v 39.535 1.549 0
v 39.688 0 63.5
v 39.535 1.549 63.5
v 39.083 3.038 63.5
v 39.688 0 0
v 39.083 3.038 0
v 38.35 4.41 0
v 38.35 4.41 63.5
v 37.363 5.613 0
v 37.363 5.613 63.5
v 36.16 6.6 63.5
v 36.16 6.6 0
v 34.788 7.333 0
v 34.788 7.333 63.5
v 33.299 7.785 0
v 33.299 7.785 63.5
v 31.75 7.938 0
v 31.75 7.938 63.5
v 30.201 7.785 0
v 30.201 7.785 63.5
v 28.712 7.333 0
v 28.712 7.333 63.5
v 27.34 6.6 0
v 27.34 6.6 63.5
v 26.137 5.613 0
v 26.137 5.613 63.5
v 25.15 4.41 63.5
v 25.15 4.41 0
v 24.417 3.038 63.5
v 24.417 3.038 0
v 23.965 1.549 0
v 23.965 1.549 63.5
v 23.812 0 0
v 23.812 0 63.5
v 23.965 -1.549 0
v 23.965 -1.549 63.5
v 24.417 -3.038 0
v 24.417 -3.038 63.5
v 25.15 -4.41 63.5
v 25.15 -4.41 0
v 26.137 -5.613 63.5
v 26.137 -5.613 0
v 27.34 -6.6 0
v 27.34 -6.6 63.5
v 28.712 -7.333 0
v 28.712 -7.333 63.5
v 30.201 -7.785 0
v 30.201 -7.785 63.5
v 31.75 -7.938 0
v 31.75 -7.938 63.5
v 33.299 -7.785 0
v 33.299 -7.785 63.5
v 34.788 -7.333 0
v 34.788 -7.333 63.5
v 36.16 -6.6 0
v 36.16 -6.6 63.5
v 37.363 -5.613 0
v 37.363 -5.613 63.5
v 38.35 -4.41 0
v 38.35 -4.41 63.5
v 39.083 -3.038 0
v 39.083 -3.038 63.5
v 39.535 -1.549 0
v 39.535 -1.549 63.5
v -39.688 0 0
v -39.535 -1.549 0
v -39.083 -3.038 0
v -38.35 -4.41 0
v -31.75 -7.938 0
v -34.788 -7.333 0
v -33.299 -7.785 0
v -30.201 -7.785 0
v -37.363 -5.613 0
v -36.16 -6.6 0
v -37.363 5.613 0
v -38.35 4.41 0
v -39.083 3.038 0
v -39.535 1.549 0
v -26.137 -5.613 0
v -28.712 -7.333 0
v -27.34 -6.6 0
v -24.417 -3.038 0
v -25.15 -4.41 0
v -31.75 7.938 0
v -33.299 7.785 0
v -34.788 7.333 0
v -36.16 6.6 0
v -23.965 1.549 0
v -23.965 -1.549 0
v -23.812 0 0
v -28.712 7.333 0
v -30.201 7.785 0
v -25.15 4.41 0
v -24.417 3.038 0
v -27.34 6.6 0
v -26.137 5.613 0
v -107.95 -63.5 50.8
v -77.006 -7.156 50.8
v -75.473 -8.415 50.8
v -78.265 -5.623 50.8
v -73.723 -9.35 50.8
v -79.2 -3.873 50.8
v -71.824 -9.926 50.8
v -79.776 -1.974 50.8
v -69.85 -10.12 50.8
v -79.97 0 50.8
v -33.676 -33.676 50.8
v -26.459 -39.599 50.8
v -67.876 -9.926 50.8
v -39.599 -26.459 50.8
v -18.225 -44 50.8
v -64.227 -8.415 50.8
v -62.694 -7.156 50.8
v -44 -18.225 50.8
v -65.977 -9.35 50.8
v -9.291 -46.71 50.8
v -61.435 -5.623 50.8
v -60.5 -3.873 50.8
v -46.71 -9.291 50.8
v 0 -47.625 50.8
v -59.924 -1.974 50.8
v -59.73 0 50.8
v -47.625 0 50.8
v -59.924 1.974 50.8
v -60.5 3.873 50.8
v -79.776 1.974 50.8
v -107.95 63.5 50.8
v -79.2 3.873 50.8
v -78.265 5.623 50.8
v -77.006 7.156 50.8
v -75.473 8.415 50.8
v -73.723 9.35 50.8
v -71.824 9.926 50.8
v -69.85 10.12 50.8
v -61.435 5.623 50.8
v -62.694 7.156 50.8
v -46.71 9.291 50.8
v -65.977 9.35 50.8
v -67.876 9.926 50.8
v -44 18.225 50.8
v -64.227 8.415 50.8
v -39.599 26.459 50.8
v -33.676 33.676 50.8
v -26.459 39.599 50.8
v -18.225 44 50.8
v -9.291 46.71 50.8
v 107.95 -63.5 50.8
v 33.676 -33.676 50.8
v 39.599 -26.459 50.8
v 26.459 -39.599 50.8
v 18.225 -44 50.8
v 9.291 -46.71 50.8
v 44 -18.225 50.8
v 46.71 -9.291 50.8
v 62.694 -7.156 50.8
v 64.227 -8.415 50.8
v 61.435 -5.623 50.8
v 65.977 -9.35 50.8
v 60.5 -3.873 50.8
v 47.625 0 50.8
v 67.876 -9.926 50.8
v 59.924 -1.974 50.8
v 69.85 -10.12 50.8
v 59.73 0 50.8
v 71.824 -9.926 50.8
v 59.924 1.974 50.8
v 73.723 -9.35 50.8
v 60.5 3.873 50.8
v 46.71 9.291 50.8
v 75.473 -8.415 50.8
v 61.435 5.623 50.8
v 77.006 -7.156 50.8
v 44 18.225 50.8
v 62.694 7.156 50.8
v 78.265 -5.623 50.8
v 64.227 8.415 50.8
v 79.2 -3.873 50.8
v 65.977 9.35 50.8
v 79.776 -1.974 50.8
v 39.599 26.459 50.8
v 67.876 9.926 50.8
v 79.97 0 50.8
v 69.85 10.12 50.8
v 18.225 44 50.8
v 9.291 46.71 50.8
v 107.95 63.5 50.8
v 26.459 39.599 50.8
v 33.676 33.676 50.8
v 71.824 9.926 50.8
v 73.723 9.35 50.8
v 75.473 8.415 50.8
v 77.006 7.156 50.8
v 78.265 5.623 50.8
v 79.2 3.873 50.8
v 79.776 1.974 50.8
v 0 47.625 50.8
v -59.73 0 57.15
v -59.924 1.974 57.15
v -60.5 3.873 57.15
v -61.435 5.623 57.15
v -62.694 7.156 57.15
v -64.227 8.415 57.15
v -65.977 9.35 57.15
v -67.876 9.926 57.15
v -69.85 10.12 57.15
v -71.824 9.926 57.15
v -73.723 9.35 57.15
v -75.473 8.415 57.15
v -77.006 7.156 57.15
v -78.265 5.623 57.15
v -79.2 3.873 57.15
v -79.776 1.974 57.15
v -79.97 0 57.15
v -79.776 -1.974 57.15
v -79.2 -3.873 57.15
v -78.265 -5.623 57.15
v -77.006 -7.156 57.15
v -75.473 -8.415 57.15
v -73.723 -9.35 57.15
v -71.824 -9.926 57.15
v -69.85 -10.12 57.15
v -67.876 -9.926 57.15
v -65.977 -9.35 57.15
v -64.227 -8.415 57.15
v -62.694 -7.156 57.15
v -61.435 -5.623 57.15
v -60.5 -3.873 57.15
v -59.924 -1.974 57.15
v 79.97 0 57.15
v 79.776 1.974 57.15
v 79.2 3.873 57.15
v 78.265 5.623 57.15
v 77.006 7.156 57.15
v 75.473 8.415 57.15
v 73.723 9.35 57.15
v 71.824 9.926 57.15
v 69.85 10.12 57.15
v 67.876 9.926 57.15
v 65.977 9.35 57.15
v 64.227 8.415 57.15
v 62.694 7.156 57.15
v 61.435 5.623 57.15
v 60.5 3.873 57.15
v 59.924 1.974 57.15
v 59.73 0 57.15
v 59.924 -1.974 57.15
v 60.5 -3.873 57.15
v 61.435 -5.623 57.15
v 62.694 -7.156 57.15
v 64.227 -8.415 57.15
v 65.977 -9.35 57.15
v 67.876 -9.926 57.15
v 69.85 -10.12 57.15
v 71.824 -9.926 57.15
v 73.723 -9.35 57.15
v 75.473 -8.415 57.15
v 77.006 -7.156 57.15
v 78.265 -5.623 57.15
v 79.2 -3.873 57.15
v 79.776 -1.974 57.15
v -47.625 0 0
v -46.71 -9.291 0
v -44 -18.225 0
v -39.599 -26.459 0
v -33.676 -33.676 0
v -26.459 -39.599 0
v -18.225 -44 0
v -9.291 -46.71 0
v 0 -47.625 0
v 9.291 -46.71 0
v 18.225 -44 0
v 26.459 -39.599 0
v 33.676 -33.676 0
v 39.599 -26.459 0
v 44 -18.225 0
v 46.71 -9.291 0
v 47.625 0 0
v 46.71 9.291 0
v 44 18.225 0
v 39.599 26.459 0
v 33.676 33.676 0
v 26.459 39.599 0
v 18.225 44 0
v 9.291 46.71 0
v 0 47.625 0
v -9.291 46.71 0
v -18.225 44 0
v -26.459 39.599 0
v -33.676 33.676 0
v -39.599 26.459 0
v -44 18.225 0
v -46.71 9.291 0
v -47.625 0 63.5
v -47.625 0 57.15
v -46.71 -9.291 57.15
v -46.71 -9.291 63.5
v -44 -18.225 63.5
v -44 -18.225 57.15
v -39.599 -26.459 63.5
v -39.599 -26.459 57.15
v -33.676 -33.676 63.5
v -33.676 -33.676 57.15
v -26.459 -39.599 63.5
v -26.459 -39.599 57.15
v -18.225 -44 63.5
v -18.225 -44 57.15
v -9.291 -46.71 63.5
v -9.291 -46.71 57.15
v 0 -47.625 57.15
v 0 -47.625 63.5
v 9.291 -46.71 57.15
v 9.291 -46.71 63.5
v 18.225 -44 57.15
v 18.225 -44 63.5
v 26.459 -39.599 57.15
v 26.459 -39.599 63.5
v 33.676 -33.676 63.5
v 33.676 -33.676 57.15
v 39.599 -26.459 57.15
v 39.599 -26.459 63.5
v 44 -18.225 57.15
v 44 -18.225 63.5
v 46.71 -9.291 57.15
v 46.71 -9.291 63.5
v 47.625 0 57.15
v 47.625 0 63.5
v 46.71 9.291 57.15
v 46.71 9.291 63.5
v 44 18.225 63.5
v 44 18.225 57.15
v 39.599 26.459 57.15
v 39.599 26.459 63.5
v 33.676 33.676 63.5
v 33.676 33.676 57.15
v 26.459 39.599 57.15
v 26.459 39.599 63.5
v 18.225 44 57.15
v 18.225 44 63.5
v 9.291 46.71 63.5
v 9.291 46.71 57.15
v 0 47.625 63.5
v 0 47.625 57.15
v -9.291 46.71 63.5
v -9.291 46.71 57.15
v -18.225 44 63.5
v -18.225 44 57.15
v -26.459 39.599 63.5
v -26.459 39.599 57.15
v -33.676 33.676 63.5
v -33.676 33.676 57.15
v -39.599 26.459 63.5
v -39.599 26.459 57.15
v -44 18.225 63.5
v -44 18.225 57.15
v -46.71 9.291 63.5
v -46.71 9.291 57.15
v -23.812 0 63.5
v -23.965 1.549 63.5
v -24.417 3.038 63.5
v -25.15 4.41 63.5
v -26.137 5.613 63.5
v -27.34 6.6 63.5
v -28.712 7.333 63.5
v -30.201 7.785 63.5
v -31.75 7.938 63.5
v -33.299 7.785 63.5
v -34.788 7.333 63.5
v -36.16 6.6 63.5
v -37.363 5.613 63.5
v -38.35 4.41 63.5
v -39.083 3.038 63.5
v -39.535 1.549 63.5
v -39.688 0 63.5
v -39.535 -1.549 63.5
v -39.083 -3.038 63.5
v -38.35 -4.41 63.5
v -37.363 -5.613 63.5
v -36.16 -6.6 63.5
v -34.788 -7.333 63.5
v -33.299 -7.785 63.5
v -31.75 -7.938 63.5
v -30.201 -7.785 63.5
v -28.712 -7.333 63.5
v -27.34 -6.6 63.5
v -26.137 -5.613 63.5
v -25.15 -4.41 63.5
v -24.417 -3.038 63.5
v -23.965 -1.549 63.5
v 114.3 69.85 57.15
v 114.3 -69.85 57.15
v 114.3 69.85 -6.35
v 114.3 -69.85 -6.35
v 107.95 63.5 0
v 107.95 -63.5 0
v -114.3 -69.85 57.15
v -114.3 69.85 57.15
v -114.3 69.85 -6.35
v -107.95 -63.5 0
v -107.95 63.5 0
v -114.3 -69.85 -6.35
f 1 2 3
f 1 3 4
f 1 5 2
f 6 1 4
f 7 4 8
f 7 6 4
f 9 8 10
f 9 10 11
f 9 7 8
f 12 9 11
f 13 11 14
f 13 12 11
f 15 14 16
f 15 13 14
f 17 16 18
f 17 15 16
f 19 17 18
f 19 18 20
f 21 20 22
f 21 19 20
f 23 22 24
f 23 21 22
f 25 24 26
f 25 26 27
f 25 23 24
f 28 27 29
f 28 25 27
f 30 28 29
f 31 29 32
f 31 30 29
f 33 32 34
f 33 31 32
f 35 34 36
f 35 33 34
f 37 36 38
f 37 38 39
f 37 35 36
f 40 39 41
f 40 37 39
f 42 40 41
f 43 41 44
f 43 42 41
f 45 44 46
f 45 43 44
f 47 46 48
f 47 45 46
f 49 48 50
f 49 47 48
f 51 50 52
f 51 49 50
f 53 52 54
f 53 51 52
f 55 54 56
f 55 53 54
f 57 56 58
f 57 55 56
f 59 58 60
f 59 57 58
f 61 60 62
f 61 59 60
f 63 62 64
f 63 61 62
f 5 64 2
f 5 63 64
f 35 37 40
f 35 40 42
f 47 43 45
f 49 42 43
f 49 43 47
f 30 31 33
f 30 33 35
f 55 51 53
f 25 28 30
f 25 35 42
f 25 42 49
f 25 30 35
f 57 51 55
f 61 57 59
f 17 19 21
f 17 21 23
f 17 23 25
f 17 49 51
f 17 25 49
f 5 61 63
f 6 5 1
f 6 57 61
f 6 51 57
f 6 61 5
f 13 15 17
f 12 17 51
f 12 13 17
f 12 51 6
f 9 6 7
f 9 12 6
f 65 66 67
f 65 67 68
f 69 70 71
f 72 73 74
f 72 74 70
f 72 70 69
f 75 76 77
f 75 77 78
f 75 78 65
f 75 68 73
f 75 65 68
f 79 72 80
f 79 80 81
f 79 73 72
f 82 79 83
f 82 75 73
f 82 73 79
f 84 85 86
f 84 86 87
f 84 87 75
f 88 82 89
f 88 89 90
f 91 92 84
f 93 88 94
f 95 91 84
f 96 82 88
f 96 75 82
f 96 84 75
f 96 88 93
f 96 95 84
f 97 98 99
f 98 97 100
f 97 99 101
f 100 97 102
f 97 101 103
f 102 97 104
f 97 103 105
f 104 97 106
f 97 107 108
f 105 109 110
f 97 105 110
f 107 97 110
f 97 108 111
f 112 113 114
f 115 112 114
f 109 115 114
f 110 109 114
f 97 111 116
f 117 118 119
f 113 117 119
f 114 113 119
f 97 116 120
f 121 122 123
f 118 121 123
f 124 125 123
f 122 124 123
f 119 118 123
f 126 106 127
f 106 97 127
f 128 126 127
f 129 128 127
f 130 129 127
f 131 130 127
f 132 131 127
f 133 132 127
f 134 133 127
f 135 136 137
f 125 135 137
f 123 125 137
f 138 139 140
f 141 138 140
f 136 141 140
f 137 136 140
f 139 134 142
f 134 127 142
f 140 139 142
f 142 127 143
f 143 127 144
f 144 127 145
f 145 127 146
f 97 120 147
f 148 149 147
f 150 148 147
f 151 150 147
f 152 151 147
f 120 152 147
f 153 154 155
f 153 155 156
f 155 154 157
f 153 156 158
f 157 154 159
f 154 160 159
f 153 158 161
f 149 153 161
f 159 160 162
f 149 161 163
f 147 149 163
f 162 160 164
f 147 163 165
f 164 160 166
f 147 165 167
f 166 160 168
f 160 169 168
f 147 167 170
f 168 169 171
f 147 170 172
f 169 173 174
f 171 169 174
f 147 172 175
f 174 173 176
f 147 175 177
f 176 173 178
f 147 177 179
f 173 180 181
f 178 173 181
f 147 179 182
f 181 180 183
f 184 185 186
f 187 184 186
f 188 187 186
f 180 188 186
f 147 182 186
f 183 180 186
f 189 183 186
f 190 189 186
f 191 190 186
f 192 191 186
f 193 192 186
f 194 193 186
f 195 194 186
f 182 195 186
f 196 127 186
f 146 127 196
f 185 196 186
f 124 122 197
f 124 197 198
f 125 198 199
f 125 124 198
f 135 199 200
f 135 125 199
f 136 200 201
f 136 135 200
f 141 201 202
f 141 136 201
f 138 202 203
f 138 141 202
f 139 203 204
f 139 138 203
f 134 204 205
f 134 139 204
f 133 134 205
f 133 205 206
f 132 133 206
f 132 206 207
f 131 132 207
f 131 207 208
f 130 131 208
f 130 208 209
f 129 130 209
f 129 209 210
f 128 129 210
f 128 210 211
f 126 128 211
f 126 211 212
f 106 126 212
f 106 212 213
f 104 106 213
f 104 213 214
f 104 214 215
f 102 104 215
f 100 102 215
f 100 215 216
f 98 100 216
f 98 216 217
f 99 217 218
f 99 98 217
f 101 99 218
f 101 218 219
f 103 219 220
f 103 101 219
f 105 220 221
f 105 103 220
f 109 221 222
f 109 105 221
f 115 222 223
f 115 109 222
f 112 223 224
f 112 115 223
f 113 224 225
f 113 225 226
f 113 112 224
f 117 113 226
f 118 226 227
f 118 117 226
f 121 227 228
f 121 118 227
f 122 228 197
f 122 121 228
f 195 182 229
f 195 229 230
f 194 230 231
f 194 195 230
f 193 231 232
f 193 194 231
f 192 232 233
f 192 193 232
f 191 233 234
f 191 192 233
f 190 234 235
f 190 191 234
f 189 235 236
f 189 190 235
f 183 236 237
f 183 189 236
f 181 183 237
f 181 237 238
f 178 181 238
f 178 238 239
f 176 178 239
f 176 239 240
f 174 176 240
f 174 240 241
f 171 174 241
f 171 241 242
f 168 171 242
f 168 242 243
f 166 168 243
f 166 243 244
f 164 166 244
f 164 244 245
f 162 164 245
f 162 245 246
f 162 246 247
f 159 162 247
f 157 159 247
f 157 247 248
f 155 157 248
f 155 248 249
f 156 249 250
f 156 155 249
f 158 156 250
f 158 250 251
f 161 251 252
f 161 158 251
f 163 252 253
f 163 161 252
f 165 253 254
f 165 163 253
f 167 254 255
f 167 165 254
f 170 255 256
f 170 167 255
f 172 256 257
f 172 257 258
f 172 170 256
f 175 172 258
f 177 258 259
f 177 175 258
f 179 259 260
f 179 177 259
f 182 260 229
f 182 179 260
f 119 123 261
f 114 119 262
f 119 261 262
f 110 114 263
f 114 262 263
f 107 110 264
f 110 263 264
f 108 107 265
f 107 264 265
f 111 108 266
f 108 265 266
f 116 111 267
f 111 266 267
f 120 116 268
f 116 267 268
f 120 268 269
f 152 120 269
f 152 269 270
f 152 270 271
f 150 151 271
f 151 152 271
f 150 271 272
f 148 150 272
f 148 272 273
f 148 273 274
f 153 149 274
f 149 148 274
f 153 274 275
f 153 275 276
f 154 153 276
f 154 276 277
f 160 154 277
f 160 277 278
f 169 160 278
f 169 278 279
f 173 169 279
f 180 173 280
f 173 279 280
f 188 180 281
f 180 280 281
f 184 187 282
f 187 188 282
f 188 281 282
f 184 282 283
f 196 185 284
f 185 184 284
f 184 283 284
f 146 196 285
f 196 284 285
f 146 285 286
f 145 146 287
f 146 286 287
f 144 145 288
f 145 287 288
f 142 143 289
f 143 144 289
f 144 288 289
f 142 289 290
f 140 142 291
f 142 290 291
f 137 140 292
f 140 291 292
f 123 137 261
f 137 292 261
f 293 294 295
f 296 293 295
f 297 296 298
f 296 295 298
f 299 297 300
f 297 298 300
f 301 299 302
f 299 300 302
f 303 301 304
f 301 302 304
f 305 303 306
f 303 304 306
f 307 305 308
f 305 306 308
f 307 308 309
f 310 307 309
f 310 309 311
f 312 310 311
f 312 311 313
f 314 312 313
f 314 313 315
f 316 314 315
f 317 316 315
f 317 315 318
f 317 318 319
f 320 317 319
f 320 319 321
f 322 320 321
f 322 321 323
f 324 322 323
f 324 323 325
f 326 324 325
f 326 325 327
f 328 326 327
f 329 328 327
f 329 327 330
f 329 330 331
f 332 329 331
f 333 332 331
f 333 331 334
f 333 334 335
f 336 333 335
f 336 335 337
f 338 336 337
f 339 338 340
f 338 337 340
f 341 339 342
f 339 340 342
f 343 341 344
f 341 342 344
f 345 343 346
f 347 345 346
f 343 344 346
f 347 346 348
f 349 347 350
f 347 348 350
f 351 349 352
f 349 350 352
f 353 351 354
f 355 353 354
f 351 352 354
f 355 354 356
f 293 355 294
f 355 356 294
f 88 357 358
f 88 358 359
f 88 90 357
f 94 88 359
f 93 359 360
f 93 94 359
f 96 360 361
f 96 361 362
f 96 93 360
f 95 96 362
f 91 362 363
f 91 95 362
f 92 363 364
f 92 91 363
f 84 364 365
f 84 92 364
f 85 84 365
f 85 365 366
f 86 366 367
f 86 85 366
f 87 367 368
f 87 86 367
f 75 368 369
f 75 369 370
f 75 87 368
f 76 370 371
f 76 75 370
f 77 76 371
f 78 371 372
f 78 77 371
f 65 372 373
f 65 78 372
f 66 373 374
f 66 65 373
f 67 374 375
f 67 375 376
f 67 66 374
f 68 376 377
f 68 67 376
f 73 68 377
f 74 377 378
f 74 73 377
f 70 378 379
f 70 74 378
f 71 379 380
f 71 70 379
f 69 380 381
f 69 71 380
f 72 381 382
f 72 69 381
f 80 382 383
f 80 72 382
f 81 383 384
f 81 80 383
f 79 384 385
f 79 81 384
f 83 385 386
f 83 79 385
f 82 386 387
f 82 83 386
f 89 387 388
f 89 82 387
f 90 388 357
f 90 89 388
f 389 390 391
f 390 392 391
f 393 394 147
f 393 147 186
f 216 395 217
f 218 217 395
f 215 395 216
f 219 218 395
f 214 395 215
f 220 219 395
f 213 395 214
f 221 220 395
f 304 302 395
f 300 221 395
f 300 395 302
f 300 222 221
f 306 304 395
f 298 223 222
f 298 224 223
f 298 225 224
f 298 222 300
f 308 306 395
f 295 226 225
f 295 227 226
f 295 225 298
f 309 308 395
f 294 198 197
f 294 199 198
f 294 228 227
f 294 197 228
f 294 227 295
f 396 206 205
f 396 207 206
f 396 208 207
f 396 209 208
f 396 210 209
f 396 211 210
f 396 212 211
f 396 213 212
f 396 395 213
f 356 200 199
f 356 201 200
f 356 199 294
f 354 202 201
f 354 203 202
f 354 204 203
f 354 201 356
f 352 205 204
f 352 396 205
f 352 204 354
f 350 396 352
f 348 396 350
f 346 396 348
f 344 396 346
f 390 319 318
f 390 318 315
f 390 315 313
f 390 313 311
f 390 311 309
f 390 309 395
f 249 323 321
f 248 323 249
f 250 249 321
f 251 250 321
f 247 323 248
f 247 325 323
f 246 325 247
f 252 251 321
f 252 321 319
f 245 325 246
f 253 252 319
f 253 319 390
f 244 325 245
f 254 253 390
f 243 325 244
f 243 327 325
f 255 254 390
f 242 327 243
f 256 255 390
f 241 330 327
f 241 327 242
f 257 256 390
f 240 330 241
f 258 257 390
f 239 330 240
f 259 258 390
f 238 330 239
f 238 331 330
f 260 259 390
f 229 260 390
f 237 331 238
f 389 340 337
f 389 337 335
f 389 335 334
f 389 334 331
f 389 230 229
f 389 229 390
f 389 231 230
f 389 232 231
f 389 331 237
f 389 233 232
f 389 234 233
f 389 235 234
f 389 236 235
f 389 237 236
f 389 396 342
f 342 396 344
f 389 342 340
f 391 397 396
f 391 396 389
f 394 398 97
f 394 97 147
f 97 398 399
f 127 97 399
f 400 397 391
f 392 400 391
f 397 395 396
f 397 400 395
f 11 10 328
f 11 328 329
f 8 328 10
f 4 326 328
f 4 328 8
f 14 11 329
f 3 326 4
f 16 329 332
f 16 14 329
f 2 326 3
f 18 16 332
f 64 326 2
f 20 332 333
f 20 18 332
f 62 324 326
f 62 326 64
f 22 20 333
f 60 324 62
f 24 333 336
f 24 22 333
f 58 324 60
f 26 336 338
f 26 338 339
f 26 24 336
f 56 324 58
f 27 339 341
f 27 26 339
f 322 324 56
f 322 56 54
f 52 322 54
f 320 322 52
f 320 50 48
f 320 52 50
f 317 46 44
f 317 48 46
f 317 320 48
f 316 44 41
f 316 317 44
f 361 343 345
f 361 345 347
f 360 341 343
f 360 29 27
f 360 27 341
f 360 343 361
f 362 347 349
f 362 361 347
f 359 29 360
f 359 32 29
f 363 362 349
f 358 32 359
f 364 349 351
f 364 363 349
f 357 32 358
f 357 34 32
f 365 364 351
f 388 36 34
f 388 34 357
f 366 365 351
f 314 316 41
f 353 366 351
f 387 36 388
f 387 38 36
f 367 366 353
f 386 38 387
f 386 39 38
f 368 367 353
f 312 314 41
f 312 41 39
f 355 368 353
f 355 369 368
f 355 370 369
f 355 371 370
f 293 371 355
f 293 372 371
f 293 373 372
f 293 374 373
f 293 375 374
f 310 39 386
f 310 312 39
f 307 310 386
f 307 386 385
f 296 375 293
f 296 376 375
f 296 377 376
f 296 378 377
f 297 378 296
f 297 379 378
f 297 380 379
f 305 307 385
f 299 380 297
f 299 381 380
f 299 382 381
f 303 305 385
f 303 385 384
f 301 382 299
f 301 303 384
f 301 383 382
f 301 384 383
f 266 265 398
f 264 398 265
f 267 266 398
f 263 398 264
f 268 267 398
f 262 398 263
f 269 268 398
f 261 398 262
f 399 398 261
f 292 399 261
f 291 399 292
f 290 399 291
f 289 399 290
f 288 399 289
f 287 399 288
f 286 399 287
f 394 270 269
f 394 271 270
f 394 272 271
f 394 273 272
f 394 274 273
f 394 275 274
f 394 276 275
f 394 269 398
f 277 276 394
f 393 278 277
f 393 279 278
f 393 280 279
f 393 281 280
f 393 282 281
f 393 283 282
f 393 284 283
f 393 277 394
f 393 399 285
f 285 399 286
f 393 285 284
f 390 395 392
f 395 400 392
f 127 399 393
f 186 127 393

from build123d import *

# Parameters (mm, degrees)
SKETCH1_W          = 228.6
SKETCH1_H          = 139.7
EXTRUDE1_DEPTH     = 6.35
SKETCH1_3_W        = 228.6
SKETCH1_3_H        = 139.7
SKETCH1_3_W_2      = 215.9
SKETCH1_3_H_2      = 127
EXTRUDE2_DEPTH     = 50.8
SKETCH1_6_R        = 47.625
SKETCH1_6_R_2      = 7.9375
EXTRUDE4_DEPTH     = 63.5
SKETCH16_W         = 228.6
SKETCH16_H         = 139.7
EXTRUDE3_DEPTH     = 6.35
SKETCH1_5_R        = 10.1203125
SKETCH1_5_R_2      = 7.9375
CUT_EXTRUDE2_DEPTH = 57.15


with BuildPart() as part:
    # Sketch1 → Extrude1 (new body)
    with BuildSketch(Plane.XY):
        Rectangle(SKETCH1_W, SKETCH1_H)
    extrude(amount=-EXTRUDE1_DEPTH)

    # Sketch1_3 → Extrude2 (add)
    with BuildSketch(Plane.XY):
        Rectangle(SKETCH1_3_W, SKETCH1_3_H)
        Rectangle(SKETCH1_3_W_2, SKETCH1_3_H_2, mode=Mode.SUBTRACT)
    extrude(amount=EXTRUDE2_DEPTH)

    # Sketch1_6 → Extrude4 (add)
    with BuildSketch(Plane.XY):
        with Locations(Location((0, 0, 0), (0, 0, 180))):
            Circle(SKETCH1_6_R)
        with Locations((-31.75, 0)):
            Circle(SKETCH1_6_R_2, mode=Mode.SUBTRACT)
        with Locations((31.75, 0)):
            Circle(SKETCH1_6_R_2, mode=Mode.SUBTRACT)
    extrude(amount=EXTRUDE4_DEPTH)

    # Sketch16 → Extrude3 (add)
    with BuildSketch(Plane.XY.offset(50.8)):
        Rectangle(SKETCH16_W, SKETCH16_H)
    extrude(amount=EXTRUDE3_DEPTH)

    # Sketch1_5 → Cut-Extrude2 (cut)
    with BuildSketch(Plane.XY):
        with Locations((-69.85, 0)):
            Circle(SKETCH1_5_R)
        with Locations((-31.75, 0)):
            Circle(SKETCH1_5_R_2)
        with Locations((69.85, 0)):
            Circle(SKETCH1_5_R)
        with Locations((31.75, 0)):
            Circle(SKETCH1_5_R_2)
    extrude(amount=CUT_EXTRUDE2_DEPTH, mode=Mode.SUBTRACT)


solid = part.part
